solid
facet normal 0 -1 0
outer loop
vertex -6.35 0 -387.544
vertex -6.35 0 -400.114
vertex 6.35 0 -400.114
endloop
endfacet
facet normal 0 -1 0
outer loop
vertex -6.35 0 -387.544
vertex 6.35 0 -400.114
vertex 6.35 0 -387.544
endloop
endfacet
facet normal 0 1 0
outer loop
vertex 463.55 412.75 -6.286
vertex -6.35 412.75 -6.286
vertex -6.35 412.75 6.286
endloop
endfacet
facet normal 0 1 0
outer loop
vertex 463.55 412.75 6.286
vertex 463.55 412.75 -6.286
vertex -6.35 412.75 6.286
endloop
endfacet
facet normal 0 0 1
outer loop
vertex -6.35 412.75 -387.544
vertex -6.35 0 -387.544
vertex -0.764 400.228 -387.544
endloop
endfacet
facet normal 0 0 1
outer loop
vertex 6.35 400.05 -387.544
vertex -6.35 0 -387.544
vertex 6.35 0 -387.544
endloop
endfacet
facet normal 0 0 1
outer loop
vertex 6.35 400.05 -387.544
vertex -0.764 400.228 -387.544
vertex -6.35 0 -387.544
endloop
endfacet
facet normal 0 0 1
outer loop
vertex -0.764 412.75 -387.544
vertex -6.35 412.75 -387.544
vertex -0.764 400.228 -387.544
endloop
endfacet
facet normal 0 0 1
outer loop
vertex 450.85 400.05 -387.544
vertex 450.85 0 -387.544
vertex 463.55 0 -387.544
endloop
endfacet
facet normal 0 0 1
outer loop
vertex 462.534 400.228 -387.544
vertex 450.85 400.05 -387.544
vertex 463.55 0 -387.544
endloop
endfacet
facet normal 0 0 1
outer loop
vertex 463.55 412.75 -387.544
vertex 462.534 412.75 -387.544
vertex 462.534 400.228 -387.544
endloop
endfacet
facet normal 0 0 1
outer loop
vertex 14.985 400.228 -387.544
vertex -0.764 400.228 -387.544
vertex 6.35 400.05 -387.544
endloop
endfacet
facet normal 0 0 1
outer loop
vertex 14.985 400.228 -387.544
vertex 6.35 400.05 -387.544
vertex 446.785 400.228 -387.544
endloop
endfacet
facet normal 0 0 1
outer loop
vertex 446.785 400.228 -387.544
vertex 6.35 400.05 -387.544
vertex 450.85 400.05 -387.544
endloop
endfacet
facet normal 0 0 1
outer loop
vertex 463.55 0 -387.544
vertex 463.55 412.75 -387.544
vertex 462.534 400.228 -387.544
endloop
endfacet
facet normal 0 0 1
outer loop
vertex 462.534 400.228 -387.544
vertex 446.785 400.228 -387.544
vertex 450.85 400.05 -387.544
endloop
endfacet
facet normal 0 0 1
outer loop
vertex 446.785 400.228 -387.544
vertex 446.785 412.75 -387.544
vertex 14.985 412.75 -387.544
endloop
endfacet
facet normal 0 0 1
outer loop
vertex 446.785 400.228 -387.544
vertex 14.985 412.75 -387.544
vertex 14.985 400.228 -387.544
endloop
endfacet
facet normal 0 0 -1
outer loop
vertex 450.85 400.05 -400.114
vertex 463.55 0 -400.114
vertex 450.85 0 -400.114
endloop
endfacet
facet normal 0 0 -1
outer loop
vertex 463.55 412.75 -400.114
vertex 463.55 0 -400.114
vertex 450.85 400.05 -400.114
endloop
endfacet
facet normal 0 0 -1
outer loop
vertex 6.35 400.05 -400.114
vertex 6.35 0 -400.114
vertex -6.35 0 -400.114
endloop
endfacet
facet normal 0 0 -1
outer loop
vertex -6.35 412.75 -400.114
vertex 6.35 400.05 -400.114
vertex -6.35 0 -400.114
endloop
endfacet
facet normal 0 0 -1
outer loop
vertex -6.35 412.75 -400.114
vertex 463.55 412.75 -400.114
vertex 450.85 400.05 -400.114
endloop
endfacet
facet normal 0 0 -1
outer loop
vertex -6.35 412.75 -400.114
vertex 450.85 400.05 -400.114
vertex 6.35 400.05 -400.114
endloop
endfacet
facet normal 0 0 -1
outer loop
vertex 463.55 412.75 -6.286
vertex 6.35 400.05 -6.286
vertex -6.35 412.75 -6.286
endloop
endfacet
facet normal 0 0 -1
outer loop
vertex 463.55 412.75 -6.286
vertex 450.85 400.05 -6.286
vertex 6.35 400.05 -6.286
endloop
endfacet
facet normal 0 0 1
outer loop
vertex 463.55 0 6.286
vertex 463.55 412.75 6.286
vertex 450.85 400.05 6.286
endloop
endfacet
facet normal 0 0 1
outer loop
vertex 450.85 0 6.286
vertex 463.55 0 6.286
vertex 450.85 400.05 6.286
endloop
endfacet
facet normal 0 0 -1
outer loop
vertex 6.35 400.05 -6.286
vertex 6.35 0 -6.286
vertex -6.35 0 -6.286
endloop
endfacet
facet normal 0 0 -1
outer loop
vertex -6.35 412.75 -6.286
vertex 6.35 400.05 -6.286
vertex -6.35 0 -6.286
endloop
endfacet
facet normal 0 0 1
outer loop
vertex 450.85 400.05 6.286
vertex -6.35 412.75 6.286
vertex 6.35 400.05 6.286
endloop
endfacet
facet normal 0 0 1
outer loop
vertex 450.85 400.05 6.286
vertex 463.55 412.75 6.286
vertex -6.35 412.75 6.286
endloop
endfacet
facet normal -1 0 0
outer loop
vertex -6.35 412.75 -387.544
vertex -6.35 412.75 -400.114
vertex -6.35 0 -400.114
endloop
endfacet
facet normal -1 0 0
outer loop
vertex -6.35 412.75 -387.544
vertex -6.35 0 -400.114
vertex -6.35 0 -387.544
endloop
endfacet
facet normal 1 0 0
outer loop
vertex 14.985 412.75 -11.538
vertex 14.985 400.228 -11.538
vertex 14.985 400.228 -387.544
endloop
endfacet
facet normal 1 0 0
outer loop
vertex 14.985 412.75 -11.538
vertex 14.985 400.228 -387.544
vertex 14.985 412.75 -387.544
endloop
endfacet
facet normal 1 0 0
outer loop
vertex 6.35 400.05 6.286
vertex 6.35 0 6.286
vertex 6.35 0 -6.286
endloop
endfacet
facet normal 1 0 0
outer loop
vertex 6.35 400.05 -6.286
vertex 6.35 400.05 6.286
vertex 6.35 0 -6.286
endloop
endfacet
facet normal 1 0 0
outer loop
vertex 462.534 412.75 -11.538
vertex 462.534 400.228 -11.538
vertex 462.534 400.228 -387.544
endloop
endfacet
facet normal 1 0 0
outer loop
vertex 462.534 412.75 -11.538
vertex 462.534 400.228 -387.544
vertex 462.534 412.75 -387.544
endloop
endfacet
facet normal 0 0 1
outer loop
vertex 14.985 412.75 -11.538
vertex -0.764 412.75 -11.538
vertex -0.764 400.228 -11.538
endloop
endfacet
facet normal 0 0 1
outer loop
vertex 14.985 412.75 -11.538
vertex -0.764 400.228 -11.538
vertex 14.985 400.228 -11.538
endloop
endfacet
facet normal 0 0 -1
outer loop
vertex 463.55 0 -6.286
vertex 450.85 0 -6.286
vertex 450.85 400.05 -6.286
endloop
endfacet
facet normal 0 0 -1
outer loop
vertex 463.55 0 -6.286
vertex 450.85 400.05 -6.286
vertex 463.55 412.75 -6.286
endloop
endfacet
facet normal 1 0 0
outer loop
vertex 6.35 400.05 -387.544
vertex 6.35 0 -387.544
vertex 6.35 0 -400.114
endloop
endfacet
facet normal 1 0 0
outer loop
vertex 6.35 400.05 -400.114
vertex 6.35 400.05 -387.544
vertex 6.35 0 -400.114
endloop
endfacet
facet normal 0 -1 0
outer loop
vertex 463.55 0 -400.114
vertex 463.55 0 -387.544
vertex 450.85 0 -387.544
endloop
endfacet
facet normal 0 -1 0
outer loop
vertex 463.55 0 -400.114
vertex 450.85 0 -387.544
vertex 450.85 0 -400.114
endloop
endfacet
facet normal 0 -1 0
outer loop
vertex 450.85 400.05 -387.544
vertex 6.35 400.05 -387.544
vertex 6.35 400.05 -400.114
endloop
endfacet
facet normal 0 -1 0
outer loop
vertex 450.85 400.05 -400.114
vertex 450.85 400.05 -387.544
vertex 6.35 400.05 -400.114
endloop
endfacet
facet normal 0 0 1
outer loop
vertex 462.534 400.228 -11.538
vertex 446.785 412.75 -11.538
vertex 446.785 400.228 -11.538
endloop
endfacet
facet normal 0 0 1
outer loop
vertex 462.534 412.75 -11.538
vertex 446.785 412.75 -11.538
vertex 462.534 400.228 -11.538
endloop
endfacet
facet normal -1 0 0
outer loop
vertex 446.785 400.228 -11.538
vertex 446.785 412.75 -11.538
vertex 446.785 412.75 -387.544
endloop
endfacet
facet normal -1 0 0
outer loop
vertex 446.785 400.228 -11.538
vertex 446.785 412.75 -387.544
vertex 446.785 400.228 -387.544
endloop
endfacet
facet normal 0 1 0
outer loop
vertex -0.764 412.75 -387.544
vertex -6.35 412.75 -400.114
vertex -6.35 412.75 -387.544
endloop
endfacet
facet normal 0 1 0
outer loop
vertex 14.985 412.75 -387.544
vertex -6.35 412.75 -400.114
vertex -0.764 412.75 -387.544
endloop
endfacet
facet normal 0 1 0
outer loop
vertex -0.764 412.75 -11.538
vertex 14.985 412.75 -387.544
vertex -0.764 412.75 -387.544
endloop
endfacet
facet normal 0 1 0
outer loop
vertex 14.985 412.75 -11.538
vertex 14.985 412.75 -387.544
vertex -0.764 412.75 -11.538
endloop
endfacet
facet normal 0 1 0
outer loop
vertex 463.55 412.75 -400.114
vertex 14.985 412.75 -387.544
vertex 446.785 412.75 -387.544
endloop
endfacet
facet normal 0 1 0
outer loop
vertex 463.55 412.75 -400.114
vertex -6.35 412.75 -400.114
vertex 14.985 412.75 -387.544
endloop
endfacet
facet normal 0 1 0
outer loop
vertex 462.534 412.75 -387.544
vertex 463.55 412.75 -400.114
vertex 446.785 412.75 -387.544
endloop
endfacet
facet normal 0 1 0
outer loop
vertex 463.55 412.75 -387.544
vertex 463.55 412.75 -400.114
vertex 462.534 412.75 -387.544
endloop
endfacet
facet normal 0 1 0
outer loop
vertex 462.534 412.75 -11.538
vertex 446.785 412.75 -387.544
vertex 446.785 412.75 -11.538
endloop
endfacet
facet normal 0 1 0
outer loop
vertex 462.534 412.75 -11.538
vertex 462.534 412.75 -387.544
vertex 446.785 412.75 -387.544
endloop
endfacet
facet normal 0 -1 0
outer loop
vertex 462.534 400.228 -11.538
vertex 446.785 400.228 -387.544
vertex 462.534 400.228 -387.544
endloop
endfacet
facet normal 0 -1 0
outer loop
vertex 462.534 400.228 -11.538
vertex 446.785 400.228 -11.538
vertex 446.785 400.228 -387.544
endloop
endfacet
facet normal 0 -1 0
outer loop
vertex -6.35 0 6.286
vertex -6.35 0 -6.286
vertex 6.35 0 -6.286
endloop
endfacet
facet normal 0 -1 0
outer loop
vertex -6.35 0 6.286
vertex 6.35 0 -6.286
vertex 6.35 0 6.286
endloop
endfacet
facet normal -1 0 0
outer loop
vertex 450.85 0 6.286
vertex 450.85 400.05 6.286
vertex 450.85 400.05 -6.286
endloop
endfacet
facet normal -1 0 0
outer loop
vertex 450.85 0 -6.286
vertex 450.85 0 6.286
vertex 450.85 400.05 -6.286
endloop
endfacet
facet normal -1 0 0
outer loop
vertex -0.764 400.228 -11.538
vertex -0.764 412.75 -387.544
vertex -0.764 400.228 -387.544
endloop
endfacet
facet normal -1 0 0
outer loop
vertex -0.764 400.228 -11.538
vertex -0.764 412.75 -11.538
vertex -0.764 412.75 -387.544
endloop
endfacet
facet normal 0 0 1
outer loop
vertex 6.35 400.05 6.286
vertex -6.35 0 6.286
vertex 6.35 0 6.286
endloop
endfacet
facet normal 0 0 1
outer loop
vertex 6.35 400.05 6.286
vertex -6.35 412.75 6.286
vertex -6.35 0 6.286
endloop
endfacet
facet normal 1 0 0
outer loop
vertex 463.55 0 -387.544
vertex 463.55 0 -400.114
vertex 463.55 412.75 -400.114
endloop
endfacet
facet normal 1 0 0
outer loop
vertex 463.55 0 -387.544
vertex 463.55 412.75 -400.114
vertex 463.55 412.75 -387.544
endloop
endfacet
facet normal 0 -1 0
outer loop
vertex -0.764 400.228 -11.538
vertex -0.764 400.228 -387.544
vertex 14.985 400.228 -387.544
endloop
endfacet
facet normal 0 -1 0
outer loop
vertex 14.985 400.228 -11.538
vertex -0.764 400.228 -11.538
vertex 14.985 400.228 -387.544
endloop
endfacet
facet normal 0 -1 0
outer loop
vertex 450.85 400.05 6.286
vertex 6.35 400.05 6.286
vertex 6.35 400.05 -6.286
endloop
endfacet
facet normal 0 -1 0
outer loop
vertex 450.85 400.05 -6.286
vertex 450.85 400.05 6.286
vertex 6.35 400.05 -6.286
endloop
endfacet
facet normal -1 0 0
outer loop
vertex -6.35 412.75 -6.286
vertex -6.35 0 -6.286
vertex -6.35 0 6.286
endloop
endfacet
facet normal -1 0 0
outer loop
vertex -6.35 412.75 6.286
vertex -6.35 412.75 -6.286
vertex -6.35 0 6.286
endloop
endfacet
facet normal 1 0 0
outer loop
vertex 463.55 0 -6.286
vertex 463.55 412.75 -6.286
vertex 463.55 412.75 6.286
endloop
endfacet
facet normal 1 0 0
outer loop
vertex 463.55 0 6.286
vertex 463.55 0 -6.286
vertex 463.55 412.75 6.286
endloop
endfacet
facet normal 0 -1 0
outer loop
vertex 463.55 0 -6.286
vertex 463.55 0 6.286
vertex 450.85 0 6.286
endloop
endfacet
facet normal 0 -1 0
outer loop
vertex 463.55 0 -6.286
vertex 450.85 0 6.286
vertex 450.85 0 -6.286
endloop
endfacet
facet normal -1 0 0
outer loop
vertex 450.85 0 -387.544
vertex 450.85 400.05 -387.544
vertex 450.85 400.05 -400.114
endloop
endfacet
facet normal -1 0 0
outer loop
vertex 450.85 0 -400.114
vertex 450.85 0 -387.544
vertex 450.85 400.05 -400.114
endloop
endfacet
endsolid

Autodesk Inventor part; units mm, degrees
ref_plane "YZ Plane" through (0, 0, 0) normal (1, 0, 0) x (0, 1, 0)
sketch "Sketch3" plane through (0, 0, 0) normal (0, 1, 0) x (-1, 0, 0)
  line L0 (6.35, 6.2855) -> (-6.35, 6.2855)
  line L1 (-6.35, 6.2855) -> (-6.35, -6.2855)
  line L2 (-6.35, -6.2855) -> (6.35, -6.2855)
  line L3 (6.35, -6.2855) -> (6.35, 6.2855)
  line L4 (6.35, 6.2855) -> (-6.35, -6.2855) construction
  line L5 (-6.35, 6.2855) -> (6.35, -6.2855) construction
  point P0 (0, 0)
  dimension "d7" = 12.7
sketch3d "3D Sketch1"
  line L0 (0, 0, 0) -> (0, 406.4, 0)
  line L1 (0, 406.4, 0) -> (457.2, 406.4, 0)
  line L2 (457.2, 406.4, 0) -> (457.2, 0, 0)
  dimension "d0" = 406.4
  dimension "d1" = 457.2
  dimension "d2" = 457.2
  dimension "d3" = 406.4
  dimension "d4" = 406.4
  dimension "d5" = 406.4
  dimension "d6" = 406.4
sweep "Sweep3" add profiles "Sketch3" path "3D Sketch1"
ref_plane "Work Plane1" through (-6.35, 412.75, -196.9145) normal (0, 0, 1) x (1, 0, 0)
mirror "Mirror1" about plane through (-6.35, 412.75, -196.9145) normal (0, 0, 1) of "Sweep3"
sketch "Sketch4" plane through (-6.35, 412.75, -387.5435) normal (0, 0, 1) x (1, 0, 0)
  line L0 (453.1353, -12.5225) -> (468.8842, -12.5225)
  line L1 (468.8842, -12.5225) -> (468.8842, 0)
  line L2 (468.8842, 0) -> (453.1353, 0)
  line L3 (453.1353, 0) -> (453.1353, -12.5225)
  line L4 (453.1353, -12.5225) -> (468.8842, 0) construction
  line L5 (468.8842, -12.5225) -> (453.1353, 0) construction
  point P0 (6.35, -412.75)
  point P1 (461.0098, -6.2613)
sketch3d "3D Sketch2"
  line L0 (457.2, 406.4, -384.0365) -> (457.2, 406.4, -8.0315)
sweep "Sweep4" add profiles "Sketch4" path "3D Sketch2"
ref_plane "Work Plane2" through (230.8853, 400.2275, -387.5435) normal (-1, 0, 0) x (0, 0, 1)
mirror "Mirror2" about plane through (230.8853, 400.2275, -387.5435) normal (-1, 0, 0) of "Sweep4"
properties part number "MetalTable"
